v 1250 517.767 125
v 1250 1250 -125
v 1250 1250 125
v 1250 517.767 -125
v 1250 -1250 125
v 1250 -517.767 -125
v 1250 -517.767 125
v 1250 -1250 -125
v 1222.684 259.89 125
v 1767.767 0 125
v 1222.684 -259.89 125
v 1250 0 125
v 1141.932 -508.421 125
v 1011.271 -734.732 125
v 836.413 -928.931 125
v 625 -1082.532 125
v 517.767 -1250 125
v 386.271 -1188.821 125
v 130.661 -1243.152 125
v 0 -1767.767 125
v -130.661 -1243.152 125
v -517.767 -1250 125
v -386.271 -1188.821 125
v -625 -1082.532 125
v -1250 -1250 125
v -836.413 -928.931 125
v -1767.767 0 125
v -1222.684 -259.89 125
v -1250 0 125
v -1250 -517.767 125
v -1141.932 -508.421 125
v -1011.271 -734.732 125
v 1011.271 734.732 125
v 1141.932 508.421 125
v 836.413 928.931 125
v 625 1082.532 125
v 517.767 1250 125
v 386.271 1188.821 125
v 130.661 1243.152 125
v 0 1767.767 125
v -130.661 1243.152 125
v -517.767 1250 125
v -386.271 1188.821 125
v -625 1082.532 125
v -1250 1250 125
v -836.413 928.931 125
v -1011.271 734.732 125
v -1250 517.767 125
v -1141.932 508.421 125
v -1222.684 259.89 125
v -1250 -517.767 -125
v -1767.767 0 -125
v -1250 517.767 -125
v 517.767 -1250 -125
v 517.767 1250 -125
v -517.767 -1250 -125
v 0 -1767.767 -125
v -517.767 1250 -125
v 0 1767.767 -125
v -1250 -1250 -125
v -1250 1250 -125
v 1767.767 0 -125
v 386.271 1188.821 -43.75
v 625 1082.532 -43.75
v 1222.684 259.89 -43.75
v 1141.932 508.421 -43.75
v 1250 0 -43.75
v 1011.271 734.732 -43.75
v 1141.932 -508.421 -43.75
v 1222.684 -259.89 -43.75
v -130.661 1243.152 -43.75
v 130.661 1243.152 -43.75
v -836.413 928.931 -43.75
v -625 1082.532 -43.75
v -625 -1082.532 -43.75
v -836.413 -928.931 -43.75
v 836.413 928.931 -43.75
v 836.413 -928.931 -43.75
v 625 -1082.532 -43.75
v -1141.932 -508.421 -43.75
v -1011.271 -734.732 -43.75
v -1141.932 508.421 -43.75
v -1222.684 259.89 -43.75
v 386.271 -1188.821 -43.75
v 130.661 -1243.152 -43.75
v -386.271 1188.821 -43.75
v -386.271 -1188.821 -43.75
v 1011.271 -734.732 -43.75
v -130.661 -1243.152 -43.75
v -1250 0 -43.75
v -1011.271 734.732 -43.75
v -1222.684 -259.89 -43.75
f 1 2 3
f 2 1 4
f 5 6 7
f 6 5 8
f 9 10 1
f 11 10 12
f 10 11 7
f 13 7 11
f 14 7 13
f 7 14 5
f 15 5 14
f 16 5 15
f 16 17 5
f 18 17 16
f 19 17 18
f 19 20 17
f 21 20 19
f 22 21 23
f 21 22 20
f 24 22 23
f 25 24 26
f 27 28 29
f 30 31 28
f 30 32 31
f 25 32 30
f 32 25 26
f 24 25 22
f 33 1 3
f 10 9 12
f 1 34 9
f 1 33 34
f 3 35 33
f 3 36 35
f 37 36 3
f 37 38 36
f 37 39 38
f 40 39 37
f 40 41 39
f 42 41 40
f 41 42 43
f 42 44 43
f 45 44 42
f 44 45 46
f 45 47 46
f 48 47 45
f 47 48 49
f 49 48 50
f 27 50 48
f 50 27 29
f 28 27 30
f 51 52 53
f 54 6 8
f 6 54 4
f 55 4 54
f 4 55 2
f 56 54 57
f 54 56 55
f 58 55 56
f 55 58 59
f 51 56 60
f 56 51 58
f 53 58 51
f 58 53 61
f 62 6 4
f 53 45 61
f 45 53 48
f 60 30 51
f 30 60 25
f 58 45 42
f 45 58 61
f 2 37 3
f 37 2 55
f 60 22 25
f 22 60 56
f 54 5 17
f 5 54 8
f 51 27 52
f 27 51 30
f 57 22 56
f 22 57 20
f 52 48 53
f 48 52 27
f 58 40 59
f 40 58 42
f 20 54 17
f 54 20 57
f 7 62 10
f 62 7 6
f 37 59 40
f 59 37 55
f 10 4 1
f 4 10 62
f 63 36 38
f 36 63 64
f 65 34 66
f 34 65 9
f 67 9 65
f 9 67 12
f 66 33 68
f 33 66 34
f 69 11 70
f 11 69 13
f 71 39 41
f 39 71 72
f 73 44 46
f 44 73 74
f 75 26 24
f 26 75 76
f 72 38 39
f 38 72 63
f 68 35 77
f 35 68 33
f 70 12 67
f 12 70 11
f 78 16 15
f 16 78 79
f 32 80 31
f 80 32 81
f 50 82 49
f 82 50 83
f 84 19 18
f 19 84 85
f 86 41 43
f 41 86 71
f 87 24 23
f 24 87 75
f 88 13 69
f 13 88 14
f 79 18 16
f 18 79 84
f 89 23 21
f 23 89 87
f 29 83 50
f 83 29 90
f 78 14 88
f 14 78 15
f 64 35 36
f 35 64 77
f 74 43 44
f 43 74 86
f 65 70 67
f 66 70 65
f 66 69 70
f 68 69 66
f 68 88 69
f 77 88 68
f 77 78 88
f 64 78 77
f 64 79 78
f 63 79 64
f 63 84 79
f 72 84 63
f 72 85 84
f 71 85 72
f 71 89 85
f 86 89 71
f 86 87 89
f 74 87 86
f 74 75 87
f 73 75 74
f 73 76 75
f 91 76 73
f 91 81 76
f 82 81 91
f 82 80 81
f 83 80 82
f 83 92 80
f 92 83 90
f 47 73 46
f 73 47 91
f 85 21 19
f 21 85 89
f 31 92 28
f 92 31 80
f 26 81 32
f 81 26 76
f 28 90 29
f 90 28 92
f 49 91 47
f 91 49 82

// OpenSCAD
cube_side = 2500;
cube_depth = 250;
difference() {
    group()
    {
        cube([cube_side, cube_side, cube_depth], center=true);
        rotate([0, 0, 45])
        {
            cube([cube_side, cube_side, cube_depth], center = true);
        }
    }
    translate([0, 0, 50]) {
        cylinder(cube_depth * 0.75 , cube_side / 2, cube_side / 2, center=true);
    }
}
